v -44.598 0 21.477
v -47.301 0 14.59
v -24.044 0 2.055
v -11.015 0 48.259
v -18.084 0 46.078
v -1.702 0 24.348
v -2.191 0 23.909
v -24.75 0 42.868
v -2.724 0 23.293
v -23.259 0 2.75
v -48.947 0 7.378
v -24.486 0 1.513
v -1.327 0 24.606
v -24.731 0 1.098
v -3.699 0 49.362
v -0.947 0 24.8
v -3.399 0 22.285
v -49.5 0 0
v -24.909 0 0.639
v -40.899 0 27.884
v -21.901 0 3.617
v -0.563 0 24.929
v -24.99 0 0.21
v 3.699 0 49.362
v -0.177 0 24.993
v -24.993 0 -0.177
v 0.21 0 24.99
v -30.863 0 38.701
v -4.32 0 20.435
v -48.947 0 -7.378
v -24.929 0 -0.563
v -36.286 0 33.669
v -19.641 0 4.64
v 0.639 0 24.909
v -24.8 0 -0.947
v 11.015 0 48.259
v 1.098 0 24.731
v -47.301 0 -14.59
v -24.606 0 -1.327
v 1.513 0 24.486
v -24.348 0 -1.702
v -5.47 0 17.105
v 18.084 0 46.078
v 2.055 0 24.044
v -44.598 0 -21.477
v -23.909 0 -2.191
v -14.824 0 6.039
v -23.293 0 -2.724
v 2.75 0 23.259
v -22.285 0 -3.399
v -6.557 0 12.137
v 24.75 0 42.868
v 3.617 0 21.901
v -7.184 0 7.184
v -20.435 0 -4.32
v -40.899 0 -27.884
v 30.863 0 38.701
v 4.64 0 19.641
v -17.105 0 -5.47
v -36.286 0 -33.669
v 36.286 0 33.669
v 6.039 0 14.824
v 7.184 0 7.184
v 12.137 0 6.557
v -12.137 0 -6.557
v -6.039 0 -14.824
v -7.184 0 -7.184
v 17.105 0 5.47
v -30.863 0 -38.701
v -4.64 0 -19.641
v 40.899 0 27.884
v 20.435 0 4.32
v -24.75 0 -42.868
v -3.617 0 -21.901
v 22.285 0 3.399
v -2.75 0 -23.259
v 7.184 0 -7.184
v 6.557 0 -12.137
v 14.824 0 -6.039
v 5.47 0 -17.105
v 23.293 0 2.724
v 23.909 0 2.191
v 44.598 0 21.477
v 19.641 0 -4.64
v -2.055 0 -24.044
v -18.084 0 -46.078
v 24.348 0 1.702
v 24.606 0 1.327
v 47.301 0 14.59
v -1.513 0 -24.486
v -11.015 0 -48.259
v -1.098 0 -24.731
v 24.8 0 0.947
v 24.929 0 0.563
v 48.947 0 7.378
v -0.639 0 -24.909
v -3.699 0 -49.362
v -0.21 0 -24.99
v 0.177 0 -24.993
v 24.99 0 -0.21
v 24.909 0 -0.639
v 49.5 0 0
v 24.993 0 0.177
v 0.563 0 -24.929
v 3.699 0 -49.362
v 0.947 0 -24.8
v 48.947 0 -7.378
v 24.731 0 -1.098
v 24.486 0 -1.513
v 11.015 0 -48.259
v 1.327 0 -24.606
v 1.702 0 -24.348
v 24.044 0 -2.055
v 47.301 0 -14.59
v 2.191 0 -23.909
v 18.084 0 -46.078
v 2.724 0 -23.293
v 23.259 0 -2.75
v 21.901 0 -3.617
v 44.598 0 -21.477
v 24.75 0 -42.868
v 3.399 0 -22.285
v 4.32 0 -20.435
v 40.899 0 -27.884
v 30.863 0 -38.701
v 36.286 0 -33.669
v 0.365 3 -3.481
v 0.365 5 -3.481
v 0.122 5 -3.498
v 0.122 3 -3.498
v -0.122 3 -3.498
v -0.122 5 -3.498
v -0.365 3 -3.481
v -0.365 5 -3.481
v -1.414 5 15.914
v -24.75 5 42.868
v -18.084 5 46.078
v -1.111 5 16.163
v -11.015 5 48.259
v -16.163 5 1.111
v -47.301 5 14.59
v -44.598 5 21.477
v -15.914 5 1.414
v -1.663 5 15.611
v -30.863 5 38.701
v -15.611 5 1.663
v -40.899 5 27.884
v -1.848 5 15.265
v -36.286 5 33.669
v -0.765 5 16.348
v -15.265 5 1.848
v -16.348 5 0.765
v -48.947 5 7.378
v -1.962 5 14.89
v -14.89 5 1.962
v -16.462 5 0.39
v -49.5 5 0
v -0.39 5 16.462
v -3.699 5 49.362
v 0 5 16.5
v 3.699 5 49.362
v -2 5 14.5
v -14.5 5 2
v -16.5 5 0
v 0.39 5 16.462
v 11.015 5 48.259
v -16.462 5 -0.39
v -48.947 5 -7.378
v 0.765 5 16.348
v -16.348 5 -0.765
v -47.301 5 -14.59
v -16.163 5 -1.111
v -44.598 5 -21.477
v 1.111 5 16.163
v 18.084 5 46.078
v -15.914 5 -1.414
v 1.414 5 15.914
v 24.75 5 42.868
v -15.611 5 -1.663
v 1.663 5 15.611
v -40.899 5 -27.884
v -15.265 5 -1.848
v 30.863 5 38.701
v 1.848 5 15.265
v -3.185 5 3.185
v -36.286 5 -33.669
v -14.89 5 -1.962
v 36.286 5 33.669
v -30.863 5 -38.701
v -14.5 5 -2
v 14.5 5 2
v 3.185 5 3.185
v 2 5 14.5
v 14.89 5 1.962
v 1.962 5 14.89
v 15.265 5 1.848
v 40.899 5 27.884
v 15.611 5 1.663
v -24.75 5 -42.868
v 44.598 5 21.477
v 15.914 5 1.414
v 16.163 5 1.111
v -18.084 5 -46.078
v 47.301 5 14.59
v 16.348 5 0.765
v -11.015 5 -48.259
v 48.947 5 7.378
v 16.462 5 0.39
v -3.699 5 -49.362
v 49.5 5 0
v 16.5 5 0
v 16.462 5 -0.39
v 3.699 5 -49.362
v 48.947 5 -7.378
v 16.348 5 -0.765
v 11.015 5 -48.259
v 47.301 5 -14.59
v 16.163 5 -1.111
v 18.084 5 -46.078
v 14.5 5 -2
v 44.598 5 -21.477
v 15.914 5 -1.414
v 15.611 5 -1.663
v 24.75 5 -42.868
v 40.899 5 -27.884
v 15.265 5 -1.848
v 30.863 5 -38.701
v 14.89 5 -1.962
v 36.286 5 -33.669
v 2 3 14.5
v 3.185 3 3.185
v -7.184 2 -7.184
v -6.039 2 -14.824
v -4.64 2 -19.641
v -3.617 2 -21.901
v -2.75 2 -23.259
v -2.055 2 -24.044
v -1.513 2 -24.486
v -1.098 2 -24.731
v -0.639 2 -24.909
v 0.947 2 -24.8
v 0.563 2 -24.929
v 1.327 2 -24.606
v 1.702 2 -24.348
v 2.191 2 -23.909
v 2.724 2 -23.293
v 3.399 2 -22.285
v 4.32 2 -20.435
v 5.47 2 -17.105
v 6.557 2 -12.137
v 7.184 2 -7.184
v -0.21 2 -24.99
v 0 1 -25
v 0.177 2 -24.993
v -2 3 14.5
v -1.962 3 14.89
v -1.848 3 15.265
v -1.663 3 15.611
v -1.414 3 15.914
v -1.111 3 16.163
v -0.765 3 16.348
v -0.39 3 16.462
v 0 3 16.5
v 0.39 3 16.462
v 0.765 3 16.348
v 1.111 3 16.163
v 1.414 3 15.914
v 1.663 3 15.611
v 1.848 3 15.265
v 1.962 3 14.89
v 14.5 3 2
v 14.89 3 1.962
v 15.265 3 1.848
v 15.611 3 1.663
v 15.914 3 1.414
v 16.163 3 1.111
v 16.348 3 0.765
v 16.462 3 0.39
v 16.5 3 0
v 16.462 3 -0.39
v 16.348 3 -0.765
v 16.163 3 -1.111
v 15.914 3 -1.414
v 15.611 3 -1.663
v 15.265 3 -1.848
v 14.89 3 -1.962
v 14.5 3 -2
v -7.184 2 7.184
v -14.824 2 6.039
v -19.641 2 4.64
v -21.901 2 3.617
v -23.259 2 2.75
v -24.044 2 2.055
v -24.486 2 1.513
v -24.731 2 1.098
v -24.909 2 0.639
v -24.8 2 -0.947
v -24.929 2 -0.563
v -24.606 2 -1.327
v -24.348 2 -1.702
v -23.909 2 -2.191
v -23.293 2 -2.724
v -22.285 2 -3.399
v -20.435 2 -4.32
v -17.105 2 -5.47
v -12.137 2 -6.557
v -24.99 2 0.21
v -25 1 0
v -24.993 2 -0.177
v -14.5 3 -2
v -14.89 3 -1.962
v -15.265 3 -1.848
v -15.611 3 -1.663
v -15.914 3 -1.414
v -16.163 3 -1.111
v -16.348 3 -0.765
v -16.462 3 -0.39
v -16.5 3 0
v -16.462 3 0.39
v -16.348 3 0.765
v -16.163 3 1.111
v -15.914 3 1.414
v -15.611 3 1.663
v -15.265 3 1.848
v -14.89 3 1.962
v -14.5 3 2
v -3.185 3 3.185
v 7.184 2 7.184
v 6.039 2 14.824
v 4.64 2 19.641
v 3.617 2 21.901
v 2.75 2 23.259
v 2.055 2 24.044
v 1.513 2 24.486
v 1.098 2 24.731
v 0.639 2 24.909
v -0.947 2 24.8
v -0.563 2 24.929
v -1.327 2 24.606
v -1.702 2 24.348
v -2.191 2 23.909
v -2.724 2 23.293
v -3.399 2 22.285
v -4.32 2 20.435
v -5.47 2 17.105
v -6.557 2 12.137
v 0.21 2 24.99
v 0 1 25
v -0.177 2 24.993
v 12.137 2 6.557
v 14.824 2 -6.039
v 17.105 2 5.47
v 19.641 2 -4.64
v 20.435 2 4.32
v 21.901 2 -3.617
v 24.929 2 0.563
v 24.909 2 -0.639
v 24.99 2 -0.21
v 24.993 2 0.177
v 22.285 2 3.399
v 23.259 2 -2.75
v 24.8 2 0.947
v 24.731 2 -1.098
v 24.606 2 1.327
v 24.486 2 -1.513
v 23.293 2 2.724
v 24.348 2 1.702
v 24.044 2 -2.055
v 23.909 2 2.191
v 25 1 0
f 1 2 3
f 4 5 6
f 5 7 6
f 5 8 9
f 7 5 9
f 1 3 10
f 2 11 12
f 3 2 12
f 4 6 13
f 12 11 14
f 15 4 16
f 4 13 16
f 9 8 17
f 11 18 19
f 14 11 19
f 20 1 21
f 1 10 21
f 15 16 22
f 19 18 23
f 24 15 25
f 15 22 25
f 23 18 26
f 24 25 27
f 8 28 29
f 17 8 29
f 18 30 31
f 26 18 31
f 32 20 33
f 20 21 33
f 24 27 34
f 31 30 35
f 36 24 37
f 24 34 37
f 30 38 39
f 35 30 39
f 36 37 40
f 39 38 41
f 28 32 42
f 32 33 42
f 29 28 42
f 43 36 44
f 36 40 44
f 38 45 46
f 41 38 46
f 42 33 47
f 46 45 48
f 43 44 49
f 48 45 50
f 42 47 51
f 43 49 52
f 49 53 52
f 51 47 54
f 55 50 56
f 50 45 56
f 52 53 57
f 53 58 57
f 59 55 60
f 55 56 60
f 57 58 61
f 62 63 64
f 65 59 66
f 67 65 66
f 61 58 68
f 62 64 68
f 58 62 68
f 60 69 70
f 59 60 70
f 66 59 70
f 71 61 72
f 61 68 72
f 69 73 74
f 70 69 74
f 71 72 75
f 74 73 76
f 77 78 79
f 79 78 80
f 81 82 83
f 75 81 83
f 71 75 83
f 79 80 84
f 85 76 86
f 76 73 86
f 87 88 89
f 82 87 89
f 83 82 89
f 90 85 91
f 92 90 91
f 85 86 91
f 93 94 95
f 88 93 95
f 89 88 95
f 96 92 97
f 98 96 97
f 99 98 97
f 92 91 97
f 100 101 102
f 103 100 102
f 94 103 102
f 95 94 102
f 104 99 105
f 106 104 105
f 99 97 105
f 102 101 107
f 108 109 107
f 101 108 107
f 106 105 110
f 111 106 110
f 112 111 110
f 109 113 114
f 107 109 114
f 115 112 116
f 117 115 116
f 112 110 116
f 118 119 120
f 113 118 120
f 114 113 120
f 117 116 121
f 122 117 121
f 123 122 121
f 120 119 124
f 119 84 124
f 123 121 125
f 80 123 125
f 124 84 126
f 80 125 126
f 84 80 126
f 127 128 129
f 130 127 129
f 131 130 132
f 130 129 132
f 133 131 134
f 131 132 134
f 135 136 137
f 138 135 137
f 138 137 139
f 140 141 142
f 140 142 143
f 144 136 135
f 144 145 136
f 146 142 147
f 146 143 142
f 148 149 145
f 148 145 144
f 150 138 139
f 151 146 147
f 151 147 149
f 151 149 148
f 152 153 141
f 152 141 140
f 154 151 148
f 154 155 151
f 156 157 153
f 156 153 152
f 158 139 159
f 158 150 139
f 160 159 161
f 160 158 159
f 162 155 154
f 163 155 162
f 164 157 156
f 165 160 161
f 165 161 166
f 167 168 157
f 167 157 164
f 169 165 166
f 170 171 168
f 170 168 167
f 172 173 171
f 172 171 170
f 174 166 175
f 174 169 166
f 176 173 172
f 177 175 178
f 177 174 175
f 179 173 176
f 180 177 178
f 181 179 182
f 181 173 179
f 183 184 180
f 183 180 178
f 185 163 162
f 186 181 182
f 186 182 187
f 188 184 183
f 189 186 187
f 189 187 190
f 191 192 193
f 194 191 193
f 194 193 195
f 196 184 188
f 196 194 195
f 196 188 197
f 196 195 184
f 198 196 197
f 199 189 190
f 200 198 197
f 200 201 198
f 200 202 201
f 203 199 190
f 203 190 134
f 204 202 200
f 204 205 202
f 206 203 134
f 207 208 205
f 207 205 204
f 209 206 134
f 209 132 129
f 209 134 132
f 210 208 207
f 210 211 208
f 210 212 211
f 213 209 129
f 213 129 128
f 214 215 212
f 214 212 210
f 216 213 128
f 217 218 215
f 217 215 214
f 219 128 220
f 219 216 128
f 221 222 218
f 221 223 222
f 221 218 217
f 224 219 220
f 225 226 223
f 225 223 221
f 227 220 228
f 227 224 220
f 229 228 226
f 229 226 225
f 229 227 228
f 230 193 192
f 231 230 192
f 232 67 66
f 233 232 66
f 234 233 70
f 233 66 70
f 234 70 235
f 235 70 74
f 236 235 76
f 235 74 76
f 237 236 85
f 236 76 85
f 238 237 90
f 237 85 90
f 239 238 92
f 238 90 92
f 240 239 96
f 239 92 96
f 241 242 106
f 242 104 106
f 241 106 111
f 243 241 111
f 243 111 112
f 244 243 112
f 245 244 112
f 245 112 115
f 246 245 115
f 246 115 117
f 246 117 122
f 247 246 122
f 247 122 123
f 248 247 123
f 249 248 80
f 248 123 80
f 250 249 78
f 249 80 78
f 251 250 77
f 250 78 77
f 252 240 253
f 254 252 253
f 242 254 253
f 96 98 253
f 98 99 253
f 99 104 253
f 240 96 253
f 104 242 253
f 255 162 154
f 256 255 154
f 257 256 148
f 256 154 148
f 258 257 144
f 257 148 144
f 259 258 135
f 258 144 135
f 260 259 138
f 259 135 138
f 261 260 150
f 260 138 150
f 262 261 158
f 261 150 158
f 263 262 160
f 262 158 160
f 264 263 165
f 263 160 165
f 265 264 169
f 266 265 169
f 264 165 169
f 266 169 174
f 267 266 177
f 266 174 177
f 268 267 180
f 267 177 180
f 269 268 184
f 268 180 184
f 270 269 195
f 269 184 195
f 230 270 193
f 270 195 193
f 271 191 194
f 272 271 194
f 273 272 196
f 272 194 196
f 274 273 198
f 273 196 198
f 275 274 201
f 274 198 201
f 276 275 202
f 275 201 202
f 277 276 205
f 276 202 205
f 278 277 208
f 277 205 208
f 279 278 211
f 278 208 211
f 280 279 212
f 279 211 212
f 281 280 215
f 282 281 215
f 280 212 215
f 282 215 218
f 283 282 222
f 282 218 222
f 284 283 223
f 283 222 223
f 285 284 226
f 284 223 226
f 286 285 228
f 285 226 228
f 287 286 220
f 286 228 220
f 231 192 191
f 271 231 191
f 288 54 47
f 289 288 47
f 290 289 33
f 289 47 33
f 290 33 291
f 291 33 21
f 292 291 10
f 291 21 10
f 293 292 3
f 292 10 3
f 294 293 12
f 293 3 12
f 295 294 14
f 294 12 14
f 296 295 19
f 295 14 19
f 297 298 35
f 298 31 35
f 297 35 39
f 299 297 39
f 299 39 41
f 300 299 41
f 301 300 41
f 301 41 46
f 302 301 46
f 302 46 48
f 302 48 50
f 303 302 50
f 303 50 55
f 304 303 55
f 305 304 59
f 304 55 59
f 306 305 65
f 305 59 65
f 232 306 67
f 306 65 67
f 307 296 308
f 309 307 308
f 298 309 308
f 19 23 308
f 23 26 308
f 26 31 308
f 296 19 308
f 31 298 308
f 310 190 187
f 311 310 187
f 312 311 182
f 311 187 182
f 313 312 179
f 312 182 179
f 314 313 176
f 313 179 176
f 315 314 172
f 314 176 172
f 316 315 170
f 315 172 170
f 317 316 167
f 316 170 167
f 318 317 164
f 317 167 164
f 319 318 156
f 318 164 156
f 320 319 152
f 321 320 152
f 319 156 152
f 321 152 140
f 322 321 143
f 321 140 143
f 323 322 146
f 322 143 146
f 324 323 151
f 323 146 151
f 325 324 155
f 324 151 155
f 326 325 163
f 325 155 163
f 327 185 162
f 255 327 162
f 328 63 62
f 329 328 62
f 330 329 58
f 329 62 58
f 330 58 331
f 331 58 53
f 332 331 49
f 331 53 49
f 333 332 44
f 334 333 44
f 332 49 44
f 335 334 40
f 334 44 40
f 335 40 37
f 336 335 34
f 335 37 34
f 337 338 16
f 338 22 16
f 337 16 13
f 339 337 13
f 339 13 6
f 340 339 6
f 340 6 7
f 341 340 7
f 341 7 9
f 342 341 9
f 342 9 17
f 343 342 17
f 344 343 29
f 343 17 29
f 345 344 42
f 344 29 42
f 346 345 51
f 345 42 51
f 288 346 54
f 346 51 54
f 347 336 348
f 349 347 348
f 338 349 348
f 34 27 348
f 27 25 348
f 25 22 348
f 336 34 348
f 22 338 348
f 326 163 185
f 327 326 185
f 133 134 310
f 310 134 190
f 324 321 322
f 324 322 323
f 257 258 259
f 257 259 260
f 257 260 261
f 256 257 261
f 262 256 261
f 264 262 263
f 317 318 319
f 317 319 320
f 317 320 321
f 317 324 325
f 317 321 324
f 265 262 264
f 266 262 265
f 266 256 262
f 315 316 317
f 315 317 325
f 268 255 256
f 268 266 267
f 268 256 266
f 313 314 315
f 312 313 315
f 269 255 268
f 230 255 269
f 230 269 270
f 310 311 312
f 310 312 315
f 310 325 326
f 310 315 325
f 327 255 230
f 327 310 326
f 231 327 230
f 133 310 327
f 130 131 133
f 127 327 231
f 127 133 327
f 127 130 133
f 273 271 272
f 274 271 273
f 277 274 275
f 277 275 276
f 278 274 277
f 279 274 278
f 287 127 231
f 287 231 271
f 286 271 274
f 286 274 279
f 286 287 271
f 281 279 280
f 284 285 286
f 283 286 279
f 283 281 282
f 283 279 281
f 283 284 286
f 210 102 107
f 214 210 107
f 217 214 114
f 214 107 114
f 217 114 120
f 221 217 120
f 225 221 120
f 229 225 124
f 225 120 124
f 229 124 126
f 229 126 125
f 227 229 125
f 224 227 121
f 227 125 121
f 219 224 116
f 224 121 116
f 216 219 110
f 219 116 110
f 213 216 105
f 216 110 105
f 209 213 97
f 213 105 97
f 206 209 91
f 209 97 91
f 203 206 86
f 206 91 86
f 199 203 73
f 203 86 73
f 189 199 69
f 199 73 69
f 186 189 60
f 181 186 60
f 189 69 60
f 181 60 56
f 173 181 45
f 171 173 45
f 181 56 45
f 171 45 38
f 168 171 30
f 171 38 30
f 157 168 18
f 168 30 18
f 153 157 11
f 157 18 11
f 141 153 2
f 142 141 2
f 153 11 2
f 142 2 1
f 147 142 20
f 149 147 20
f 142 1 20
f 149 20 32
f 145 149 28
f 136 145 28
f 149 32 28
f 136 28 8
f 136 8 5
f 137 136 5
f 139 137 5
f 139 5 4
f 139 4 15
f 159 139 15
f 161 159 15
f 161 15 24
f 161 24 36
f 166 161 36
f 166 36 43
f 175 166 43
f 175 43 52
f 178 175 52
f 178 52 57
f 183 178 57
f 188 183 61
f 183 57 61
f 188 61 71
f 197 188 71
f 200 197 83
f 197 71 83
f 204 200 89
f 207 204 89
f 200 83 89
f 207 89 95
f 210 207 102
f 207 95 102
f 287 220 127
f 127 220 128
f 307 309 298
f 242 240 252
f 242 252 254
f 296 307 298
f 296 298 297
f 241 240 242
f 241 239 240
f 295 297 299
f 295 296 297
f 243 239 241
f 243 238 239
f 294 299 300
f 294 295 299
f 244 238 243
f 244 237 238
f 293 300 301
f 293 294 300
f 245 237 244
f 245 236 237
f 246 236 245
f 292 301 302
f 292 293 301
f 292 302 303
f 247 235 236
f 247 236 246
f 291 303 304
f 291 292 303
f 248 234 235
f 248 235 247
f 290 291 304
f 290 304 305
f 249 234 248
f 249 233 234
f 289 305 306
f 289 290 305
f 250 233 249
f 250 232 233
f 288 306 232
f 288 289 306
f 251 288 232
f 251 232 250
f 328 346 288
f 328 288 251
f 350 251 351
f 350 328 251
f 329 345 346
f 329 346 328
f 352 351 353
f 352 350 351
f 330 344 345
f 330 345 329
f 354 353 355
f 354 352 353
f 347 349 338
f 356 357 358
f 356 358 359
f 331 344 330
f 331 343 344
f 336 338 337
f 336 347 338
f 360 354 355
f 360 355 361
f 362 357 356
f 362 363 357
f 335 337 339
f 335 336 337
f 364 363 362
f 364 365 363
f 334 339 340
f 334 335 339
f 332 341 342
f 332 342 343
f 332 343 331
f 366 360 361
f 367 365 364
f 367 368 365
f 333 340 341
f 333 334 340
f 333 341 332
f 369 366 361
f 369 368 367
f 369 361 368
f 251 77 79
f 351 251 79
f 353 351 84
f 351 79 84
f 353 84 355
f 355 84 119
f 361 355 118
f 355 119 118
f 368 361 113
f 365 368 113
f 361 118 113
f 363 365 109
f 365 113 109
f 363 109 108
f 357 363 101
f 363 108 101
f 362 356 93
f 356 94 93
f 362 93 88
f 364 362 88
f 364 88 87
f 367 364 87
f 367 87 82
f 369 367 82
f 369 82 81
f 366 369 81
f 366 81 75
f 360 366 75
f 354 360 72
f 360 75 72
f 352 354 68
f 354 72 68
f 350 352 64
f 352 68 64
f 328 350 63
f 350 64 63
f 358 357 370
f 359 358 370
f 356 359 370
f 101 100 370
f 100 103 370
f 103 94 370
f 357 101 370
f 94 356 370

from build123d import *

# Parameters (mm, degrees)
SKETCH1_R           = 49.5
BOSS_EXTRUDE1_DEPTH = 5
CUT_EXTRUDE1_DEPTH  = 2
CUT_EXTRUDE2_DEPTH  = 2


with BuildPart() as part:
    # Sketch1 → Boss-Extrude1 (new body)
    with BuildSketch(Plane(origin=(0, 0, 0), x_dir=(1, 0, 0), z_dir=(0, 1, 0))):
        Circle(SKETCH1_R)
    extrude(amount=BOSS_EXTRUDE1_DEPTH)

    # Sketch2 → Cut-Extrude1 (cut)
    with BuildSketch(Plane(origin=(0, 5, 0), x_dir=(1, 0, 0), z_dir=(0, 1, 0))):
        with BuildLine():
            Line((14.5, 2), (0.364696883, 3.480947599))
            ThreePointArc((0.364696883, 3.480947599), (0, 3.5), (-0.364696883, 3.480947599))
            Line((-0.364696883, 3.480947599), (-14.5, 2))
            ThreePointArc((-14.5, 2), (-16.5, 0), (-14.5, -2))
            Line((-14.5, -2), (-3.185421861, -3.185421861))
            Line((-3.185421861, -3.185421861), (-2, -14.5))
            ThreePointArc((-2, -14.5), (0, -16.5), (2, -14.5))
            Line((2, -14.5), (3.185421861, -3.185421861))
            Line((3.185421861, -3.185421861), (14.5, -2))
            ThreePointArc((14.5, -2), (16.5, 0), (14.5, 2))
        make_face()
    extrude(amount=-CUT_EXTRUDE1_DEPTH, mode=Mode.SUBTRACT)

    # Sketch3 → Cut-Extrude2 (cut)
    with BuildSketch(Plane.XZ):
        with BuildLine():
            add(Edge.make_bspline(
                [(7.183697139, 7.183697139), (0, 87.002554241), (-7.183697139, 7.183697139)],
                knots=[1.862253121, 1.862253121, 1.862253121, 4.420932186, 4.420932186, 4.420932186], degree=2, weights=[1, 0.287347886, 1]))
            add(Edge.make_bspline(
                [(-7.183697139, 7.183697139), (-87.002554241, 0), (-7.183697139, -7.183697139)],
                knots=[5.003845775, 5.003845775, 5.003845775, 7.562524839, 7.562524839, 7.562524839], degree=2, weights=[1, 0.287347886, 1]))
            add(Edge.make_bspline(
                [(-7.183697139, -7.183697139), (0, -87.002554241), (7.183697139, -7.183697139)],
                knots=[5.003845775, 5.003845775, 5.003845775, 7.562524839, 7.562524839, 7.562524839], degree=2, weights=[1, 0.287347886, 1]))
            add(Edge.make_bspline(
                [(7.183697139, -7.183697139), (87.002554241, 0), (7.183697139, 7.183697139)],
                knots=[1.862253121, 1.862253121, 1.862253121, 4.420932186, 4.420932186, 4.420932186], degree=2, weights=[1, 0.287347886, 1]))
        make_face()
    extrude(amount=-CUT_EXTRUDE2_DEPTH, mode=Mode.SUBTRACT)


solid = part.part
